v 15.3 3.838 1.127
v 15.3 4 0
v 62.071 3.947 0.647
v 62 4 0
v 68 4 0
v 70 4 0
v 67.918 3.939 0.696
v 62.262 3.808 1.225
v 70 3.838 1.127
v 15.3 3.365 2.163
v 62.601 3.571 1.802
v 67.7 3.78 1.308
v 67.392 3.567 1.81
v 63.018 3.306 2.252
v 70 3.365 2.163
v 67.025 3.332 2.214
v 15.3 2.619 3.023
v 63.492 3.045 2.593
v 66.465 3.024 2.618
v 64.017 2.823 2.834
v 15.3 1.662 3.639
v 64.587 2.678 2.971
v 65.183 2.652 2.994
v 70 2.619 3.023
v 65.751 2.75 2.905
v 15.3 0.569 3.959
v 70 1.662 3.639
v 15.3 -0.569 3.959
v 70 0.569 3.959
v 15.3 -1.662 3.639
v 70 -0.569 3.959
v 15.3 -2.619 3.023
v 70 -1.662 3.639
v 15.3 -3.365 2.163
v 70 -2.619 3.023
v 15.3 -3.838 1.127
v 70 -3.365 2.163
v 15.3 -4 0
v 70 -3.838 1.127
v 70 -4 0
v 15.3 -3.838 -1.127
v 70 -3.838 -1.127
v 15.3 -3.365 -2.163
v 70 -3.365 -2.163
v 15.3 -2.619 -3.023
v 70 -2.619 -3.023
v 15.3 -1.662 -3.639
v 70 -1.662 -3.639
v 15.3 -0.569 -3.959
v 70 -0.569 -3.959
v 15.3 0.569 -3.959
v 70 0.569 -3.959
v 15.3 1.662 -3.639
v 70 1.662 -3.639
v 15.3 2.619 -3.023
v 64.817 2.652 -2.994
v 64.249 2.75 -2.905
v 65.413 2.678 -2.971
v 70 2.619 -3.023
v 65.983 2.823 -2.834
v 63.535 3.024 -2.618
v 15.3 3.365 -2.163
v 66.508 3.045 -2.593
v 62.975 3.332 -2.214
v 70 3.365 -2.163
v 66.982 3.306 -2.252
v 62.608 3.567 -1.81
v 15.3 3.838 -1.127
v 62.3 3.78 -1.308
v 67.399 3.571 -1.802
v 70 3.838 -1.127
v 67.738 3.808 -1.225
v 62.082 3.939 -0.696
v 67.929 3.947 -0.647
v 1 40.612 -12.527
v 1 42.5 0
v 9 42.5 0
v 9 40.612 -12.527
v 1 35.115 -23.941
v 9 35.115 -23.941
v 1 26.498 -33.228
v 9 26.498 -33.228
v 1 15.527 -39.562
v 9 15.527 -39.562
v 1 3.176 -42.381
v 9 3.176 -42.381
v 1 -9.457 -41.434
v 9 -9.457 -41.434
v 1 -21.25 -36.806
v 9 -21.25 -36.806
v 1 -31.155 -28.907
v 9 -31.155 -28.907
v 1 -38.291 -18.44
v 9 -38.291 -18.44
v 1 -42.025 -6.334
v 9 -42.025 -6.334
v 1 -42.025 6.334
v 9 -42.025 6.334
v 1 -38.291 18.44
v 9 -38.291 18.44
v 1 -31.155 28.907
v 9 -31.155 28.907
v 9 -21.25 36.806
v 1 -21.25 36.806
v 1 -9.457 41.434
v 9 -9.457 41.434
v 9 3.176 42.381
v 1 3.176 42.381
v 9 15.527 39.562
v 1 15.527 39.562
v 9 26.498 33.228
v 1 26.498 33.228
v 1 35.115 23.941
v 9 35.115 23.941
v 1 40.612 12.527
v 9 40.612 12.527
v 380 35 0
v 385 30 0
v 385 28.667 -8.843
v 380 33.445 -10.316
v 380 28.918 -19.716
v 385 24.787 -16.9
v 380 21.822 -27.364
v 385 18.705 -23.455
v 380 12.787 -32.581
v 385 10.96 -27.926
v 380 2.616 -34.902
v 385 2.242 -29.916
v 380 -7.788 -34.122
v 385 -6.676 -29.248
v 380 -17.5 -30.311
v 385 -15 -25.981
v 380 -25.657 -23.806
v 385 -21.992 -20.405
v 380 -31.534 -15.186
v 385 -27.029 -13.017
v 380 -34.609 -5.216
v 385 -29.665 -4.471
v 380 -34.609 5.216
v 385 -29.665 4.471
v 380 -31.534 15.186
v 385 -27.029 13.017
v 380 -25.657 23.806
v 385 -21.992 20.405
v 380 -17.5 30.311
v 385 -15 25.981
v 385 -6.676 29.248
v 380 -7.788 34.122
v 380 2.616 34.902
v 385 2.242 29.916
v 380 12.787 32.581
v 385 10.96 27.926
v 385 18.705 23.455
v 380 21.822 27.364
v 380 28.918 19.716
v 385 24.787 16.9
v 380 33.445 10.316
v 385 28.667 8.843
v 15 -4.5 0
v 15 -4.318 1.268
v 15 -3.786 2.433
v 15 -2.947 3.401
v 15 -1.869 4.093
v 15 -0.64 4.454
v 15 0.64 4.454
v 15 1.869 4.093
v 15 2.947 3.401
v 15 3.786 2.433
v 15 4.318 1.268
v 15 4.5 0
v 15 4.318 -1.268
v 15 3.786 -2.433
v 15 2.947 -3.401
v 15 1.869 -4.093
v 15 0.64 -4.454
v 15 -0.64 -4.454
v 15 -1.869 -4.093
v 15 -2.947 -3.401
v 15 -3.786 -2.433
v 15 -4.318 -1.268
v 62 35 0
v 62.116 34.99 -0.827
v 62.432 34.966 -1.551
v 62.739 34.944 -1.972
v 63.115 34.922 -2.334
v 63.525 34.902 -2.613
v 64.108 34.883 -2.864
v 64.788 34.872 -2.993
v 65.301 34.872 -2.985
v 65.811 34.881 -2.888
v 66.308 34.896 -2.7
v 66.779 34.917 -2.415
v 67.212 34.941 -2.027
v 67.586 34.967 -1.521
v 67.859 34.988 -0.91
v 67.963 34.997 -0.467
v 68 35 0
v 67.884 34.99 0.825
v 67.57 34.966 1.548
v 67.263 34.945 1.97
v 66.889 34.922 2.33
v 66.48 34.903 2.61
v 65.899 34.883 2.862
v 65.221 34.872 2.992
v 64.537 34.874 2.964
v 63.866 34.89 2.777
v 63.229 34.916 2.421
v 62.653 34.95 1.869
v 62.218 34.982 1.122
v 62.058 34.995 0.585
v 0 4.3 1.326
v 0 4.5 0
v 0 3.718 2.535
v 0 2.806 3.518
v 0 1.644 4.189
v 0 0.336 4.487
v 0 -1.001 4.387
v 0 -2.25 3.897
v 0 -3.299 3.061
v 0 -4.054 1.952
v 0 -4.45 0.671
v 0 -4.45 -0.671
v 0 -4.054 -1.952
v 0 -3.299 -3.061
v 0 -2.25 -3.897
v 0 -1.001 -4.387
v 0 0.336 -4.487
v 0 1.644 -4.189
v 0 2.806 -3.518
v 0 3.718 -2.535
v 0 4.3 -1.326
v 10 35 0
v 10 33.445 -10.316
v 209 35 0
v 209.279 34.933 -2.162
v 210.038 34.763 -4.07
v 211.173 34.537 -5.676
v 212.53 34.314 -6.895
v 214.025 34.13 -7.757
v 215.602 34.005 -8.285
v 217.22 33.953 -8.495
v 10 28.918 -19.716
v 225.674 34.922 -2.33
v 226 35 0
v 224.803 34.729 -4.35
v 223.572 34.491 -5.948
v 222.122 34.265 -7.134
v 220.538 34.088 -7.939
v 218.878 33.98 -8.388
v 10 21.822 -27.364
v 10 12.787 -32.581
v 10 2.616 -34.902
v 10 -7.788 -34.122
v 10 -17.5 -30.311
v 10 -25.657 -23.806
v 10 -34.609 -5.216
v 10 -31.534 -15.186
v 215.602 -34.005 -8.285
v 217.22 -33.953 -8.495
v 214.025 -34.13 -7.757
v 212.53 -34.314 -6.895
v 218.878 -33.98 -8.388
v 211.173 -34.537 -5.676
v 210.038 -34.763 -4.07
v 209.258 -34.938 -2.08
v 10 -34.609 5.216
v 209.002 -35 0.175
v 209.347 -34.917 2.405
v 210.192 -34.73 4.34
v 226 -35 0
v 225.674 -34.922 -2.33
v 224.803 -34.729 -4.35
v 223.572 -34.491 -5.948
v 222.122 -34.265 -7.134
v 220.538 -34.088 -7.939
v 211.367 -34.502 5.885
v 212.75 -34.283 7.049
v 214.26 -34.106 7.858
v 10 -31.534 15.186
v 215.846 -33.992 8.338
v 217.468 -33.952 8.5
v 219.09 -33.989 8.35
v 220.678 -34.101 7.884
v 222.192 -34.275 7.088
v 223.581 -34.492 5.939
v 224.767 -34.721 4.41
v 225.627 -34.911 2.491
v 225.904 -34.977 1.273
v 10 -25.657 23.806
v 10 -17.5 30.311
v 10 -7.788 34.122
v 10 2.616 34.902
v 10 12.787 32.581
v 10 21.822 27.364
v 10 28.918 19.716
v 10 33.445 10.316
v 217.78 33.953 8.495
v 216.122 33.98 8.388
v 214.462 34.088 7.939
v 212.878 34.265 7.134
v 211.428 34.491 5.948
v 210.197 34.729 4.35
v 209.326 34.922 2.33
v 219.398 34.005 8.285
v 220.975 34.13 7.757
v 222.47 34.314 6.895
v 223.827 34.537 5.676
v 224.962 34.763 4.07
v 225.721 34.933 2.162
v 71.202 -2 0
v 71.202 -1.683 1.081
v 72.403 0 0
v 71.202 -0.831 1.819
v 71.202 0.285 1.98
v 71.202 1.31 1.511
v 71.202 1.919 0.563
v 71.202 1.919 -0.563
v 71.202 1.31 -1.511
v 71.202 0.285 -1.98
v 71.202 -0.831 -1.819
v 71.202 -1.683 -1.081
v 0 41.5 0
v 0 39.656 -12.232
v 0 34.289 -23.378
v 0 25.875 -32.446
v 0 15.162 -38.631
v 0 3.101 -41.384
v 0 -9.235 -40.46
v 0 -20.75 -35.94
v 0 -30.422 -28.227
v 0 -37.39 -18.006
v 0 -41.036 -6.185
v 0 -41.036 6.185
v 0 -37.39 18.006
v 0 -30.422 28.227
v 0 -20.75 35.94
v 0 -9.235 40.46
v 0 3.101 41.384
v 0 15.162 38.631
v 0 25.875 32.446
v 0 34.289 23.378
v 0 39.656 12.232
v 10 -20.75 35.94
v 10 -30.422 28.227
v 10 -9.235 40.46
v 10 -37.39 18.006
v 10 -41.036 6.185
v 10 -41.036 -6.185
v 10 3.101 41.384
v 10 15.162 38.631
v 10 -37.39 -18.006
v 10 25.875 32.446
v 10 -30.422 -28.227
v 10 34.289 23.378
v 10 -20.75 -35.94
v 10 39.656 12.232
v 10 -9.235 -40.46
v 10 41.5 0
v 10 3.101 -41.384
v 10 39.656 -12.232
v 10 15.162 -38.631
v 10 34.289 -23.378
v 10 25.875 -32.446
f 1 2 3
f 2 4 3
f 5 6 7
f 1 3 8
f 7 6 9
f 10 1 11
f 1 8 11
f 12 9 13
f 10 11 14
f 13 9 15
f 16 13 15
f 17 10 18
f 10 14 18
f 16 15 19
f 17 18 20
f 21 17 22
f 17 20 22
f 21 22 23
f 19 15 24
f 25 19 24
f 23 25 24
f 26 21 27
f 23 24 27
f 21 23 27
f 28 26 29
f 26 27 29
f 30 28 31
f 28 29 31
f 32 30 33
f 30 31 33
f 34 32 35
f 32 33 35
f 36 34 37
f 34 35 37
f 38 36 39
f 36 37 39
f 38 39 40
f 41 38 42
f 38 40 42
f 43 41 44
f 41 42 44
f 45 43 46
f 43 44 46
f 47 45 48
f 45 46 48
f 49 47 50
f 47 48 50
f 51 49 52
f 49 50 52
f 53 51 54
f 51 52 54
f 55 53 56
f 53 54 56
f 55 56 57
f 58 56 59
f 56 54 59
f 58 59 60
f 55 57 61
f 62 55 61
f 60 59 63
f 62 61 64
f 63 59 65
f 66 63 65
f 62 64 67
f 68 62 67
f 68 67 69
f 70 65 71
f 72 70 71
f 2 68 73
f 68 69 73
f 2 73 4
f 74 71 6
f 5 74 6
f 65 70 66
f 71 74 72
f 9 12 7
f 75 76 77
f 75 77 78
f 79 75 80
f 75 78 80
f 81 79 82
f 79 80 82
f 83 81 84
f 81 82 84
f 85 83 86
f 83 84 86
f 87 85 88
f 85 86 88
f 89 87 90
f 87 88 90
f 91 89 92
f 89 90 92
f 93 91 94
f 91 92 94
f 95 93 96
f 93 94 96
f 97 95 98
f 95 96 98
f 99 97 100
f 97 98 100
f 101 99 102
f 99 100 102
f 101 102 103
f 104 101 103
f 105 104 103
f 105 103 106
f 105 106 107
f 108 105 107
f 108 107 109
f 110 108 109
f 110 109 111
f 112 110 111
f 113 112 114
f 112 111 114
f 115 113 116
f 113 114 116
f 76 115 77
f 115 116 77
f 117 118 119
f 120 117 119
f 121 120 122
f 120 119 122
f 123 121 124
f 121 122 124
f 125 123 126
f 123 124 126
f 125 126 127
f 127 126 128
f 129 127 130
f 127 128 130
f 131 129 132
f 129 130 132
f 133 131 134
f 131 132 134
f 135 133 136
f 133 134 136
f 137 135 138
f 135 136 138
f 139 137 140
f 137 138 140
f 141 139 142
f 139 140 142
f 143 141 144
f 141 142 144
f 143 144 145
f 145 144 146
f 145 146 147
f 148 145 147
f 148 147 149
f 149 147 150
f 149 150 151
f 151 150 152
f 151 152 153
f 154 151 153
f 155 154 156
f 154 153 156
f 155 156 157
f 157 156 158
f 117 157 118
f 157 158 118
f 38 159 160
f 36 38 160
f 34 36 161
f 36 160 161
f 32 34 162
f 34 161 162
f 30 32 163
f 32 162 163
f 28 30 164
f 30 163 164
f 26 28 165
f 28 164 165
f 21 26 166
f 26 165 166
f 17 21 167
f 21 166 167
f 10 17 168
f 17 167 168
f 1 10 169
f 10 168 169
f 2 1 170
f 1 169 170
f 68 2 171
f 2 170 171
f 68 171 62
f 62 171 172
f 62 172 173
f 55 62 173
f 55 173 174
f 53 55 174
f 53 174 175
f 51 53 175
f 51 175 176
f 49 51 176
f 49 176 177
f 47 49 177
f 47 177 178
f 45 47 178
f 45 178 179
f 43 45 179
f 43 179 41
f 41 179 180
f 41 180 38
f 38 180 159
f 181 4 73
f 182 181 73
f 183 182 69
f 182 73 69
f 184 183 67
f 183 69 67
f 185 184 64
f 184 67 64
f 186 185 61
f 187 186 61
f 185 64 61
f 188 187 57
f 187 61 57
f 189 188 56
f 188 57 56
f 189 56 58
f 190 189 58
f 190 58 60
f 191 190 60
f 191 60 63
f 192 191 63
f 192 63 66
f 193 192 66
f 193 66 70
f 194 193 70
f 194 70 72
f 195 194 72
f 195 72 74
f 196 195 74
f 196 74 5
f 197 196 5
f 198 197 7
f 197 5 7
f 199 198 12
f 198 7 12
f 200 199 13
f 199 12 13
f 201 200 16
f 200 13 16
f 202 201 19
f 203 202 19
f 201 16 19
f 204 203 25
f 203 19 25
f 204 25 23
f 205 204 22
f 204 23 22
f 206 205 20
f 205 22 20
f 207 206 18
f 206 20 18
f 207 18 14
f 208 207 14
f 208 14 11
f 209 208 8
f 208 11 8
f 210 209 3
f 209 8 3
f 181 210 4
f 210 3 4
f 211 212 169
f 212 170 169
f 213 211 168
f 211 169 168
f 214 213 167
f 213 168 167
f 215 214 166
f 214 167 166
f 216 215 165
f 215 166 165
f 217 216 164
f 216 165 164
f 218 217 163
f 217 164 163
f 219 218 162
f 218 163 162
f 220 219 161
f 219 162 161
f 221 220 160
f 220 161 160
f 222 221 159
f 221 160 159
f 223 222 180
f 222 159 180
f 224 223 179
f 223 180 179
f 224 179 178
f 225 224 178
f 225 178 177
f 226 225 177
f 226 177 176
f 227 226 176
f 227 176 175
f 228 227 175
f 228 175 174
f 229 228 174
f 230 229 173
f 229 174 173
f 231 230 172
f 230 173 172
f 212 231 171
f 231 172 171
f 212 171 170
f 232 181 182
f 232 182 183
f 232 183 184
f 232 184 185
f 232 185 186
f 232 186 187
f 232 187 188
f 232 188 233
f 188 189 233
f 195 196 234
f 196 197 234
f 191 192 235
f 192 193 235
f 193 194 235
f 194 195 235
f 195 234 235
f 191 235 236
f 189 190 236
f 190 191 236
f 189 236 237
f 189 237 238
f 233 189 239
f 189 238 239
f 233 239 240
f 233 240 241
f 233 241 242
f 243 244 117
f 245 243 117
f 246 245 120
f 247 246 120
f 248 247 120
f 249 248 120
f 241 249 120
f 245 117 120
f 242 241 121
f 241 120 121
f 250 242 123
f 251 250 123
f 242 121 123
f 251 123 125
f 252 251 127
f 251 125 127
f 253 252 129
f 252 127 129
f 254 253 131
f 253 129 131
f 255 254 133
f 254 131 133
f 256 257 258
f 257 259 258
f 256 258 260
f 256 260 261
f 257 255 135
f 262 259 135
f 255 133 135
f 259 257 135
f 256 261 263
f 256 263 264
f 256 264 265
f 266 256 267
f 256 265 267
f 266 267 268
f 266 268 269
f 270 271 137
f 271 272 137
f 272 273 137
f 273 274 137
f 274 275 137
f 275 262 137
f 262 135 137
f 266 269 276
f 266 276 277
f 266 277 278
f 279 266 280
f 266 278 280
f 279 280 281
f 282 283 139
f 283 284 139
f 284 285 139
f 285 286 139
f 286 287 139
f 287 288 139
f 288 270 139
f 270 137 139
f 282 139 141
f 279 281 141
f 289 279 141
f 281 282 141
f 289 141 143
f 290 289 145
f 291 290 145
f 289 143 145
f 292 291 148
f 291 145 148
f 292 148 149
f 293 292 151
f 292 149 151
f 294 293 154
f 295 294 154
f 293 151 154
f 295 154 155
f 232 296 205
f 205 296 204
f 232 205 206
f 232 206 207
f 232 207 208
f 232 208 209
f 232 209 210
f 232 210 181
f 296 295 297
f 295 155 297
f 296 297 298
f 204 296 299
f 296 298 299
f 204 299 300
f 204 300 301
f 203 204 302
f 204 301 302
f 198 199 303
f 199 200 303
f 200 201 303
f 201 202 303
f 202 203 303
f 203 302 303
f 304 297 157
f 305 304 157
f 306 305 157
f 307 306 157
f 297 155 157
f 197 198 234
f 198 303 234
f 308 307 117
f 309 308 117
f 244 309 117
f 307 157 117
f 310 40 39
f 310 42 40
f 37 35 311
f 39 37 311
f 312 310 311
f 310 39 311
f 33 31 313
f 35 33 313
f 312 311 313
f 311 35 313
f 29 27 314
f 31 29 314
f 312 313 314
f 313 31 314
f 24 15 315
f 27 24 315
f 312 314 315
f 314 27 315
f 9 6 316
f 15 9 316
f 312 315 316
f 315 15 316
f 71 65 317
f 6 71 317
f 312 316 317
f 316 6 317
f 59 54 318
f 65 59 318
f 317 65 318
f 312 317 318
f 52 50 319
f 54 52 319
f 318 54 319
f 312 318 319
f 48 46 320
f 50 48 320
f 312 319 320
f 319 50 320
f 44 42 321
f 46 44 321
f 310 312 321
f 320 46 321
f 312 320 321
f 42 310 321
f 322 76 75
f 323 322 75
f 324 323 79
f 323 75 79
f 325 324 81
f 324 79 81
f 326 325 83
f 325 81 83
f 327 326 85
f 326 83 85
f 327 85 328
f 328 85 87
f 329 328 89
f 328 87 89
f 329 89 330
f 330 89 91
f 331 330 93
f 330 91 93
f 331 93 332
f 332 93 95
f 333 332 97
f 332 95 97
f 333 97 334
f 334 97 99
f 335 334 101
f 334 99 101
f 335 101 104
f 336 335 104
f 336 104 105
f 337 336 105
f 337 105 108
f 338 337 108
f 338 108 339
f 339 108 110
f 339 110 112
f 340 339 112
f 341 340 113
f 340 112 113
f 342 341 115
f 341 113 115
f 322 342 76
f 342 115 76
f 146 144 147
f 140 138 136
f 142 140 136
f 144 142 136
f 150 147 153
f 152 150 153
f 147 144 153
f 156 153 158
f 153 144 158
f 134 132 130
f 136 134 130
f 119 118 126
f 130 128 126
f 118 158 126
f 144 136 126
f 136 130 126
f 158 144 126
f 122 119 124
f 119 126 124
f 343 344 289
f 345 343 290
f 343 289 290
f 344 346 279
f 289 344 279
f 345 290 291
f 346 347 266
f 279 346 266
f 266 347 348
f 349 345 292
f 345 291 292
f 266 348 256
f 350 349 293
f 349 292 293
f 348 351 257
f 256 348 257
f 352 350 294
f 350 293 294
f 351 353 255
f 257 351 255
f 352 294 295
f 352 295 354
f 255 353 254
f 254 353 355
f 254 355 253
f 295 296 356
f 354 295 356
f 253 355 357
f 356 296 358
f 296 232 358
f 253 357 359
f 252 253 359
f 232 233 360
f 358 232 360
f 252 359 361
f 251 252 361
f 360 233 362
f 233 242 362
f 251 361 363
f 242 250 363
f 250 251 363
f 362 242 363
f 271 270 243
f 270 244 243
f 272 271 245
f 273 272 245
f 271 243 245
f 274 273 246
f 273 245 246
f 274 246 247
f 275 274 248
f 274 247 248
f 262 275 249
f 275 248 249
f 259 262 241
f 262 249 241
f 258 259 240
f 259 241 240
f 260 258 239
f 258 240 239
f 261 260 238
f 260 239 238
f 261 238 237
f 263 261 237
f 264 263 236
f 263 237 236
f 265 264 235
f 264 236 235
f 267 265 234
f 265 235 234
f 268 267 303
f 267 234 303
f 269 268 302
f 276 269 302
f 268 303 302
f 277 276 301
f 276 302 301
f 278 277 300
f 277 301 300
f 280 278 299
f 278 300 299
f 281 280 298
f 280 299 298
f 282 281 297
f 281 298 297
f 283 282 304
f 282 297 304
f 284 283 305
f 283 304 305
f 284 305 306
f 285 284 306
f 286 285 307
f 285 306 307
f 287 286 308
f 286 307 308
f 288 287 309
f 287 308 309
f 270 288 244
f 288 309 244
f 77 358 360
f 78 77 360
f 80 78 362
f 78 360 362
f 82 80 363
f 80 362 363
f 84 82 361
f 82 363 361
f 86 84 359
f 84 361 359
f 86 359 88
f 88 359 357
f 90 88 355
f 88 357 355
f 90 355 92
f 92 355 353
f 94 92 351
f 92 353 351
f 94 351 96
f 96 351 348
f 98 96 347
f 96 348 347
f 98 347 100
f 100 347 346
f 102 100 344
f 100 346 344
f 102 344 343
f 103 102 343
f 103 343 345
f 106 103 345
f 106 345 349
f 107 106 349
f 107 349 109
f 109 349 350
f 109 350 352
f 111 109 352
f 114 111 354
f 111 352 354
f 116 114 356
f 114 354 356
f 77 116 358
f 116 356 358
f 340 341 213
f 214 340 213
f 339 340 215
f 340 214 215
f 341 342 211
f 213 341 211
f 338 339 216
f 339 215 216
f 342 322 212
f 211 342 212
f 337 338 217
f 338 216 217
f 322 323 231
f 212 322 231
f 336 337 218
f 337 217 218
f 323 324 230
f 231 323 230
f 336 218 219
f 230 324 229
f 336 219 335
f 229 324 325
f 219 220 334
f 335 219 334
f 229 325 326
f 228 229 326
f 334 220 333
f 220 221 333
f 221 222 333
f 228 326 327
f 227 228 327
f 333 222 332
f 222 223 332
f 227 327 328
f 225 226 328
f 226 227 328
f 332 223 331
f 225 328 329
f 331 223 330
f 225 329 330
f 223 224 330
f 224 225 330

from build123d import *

# Parameters (mm, degrees)
CHAMFER_1_SIZE            = 1
HOLE_WIZARD_8_0_8_1_D     = 8
HOLE_WIZARD_8_0_8_1_DEPTH = 70
HOLE_WIZARD_8_0_8_1_TIP   = 2.403442476
CHAMFER_2_SIZE            = 5
M10X1_0_1_D               = 9
M10X1_0_1_DEPTH           = 15
M10X1_0_1_TIP             = 2.703872786
HOLE_WIZARD_6_0_6_4_D     = 6
HOLE_WIZARD_6_0_6_4_DEPTH = 35
HOLE_WIZARD_6_0_6_4_TIP   = 1.802581857
SKETCH_8_R                = 8.5
CUT_EXTRUDE_1_DEPTH       = 35


with BuildPart() as part:
    # 草图1 → 旋转1 (revolve)
    with BuildSketch(Plane.XY):
        Polygon((0, 0), (0, 42.5), (10, 42.5), (10, 35), (385, 35), (385, 0), align=None)
    revolve(axis=Axis((385, 0, 0), (-1, 0, 0)))

    # 倒角1
    chamfer_1_edges = [part.edges().sort_by_distance(p)[0] for p in [
        (10, -42.5, 0),
        (0, -42.5, 0),
    ]]
    chamfer(chamfer_1_edges, length=CHAMFER_1_SIZE)

    # Ø8.0 (8) 直径孔1
    with Locations(Plane(origin=(0, 0, 0), x_dir=(0, -1, 0), z_dir=(-1, 0, 0))):
        with Locations((0, 0)):
            Hole(HOLE_WIZARD_8_0_8_1_D / 2, depth=HOLE_WIZARD_8_0_8_1_DEPTH)
            with Locations((0, 0, -(HOLE_WIZARD_8_0_8_1_DEPTH + HOLE_WIZARD_8_0_8_1_TIP / 2))):  # 118° drill point
                Cone(0, HOLE_WIZARD_8_0_8_1_D / 2, HOLE_WIZARD_8_0_8_1_TIP, mode=Mode.SUBTRACT)

    # 倒角2
    chamfer_2_edges = [part.edges().sort_by_distance(p)[0] for p in [
        (385, -35, 0),
    ]]
    chamfer(chamfer_2_edges, length=CHAMFER_2_SIZE)

    # M10x1.0 螺纹孔1
    with Locations(Plane(origin=(0, 0, 0), x_dir=(0, -1, 0), z_dir=(-1, 0, 0))):
        with Locations((0, 0)):
            Hole(M10X1_0_1_D / 2, depth=M10X1_0_1_DEPTH)
            with Locations((0, 0, -(M10X1_0_1_DEPTH + M10X1_0_1_TIP / 2))):  # 118° drill point
                Cone(0, M10X1_0_1_D / 2, M10X1_0_1_TIP, mode=Mode.SUBTRACT)

    # Ø6.0 (6) 直径孔4
    with Locations(Plane(origin=(0, 35, 0), x_dir=(1, 0, 0), z_dir=(0, 1, 0))):
        with Locations((65, 0)):
            Hole(HOLE_WIZARD_6_0_6_4_D / 2, depth=HOLE_WIZARD_6_0_6_4_DEPTH)
            with Locations((0, 0, -(HOLE_WIZARD_6_0_6_4_DEPTH + HOLE_WIZARD_6_0_6_4_TIP / 2))):  # 118° drill point
                Cone(0, HOLE_WIZARD_6_0_6_4_D / 2, HOLE_WIZARD_6_0_6_4_TIP, mode=Mode.SUBTRACT)

    # 草图8 → 切除-拉伸1 (cut, symmetric)
    with BuildSketch(Plane(origin=(0, 0, 0), x_dir=(1, 0, 0), z_dir=(0, 1, 0))):
        with Locations((217.5, 0)):
            Circle(SKETCH_8_R)
    extrude(amount=CUT_EXTRUDE_1_DEPTH, both=True, mode=Mode.SUBTRACT)


solid = part.part
